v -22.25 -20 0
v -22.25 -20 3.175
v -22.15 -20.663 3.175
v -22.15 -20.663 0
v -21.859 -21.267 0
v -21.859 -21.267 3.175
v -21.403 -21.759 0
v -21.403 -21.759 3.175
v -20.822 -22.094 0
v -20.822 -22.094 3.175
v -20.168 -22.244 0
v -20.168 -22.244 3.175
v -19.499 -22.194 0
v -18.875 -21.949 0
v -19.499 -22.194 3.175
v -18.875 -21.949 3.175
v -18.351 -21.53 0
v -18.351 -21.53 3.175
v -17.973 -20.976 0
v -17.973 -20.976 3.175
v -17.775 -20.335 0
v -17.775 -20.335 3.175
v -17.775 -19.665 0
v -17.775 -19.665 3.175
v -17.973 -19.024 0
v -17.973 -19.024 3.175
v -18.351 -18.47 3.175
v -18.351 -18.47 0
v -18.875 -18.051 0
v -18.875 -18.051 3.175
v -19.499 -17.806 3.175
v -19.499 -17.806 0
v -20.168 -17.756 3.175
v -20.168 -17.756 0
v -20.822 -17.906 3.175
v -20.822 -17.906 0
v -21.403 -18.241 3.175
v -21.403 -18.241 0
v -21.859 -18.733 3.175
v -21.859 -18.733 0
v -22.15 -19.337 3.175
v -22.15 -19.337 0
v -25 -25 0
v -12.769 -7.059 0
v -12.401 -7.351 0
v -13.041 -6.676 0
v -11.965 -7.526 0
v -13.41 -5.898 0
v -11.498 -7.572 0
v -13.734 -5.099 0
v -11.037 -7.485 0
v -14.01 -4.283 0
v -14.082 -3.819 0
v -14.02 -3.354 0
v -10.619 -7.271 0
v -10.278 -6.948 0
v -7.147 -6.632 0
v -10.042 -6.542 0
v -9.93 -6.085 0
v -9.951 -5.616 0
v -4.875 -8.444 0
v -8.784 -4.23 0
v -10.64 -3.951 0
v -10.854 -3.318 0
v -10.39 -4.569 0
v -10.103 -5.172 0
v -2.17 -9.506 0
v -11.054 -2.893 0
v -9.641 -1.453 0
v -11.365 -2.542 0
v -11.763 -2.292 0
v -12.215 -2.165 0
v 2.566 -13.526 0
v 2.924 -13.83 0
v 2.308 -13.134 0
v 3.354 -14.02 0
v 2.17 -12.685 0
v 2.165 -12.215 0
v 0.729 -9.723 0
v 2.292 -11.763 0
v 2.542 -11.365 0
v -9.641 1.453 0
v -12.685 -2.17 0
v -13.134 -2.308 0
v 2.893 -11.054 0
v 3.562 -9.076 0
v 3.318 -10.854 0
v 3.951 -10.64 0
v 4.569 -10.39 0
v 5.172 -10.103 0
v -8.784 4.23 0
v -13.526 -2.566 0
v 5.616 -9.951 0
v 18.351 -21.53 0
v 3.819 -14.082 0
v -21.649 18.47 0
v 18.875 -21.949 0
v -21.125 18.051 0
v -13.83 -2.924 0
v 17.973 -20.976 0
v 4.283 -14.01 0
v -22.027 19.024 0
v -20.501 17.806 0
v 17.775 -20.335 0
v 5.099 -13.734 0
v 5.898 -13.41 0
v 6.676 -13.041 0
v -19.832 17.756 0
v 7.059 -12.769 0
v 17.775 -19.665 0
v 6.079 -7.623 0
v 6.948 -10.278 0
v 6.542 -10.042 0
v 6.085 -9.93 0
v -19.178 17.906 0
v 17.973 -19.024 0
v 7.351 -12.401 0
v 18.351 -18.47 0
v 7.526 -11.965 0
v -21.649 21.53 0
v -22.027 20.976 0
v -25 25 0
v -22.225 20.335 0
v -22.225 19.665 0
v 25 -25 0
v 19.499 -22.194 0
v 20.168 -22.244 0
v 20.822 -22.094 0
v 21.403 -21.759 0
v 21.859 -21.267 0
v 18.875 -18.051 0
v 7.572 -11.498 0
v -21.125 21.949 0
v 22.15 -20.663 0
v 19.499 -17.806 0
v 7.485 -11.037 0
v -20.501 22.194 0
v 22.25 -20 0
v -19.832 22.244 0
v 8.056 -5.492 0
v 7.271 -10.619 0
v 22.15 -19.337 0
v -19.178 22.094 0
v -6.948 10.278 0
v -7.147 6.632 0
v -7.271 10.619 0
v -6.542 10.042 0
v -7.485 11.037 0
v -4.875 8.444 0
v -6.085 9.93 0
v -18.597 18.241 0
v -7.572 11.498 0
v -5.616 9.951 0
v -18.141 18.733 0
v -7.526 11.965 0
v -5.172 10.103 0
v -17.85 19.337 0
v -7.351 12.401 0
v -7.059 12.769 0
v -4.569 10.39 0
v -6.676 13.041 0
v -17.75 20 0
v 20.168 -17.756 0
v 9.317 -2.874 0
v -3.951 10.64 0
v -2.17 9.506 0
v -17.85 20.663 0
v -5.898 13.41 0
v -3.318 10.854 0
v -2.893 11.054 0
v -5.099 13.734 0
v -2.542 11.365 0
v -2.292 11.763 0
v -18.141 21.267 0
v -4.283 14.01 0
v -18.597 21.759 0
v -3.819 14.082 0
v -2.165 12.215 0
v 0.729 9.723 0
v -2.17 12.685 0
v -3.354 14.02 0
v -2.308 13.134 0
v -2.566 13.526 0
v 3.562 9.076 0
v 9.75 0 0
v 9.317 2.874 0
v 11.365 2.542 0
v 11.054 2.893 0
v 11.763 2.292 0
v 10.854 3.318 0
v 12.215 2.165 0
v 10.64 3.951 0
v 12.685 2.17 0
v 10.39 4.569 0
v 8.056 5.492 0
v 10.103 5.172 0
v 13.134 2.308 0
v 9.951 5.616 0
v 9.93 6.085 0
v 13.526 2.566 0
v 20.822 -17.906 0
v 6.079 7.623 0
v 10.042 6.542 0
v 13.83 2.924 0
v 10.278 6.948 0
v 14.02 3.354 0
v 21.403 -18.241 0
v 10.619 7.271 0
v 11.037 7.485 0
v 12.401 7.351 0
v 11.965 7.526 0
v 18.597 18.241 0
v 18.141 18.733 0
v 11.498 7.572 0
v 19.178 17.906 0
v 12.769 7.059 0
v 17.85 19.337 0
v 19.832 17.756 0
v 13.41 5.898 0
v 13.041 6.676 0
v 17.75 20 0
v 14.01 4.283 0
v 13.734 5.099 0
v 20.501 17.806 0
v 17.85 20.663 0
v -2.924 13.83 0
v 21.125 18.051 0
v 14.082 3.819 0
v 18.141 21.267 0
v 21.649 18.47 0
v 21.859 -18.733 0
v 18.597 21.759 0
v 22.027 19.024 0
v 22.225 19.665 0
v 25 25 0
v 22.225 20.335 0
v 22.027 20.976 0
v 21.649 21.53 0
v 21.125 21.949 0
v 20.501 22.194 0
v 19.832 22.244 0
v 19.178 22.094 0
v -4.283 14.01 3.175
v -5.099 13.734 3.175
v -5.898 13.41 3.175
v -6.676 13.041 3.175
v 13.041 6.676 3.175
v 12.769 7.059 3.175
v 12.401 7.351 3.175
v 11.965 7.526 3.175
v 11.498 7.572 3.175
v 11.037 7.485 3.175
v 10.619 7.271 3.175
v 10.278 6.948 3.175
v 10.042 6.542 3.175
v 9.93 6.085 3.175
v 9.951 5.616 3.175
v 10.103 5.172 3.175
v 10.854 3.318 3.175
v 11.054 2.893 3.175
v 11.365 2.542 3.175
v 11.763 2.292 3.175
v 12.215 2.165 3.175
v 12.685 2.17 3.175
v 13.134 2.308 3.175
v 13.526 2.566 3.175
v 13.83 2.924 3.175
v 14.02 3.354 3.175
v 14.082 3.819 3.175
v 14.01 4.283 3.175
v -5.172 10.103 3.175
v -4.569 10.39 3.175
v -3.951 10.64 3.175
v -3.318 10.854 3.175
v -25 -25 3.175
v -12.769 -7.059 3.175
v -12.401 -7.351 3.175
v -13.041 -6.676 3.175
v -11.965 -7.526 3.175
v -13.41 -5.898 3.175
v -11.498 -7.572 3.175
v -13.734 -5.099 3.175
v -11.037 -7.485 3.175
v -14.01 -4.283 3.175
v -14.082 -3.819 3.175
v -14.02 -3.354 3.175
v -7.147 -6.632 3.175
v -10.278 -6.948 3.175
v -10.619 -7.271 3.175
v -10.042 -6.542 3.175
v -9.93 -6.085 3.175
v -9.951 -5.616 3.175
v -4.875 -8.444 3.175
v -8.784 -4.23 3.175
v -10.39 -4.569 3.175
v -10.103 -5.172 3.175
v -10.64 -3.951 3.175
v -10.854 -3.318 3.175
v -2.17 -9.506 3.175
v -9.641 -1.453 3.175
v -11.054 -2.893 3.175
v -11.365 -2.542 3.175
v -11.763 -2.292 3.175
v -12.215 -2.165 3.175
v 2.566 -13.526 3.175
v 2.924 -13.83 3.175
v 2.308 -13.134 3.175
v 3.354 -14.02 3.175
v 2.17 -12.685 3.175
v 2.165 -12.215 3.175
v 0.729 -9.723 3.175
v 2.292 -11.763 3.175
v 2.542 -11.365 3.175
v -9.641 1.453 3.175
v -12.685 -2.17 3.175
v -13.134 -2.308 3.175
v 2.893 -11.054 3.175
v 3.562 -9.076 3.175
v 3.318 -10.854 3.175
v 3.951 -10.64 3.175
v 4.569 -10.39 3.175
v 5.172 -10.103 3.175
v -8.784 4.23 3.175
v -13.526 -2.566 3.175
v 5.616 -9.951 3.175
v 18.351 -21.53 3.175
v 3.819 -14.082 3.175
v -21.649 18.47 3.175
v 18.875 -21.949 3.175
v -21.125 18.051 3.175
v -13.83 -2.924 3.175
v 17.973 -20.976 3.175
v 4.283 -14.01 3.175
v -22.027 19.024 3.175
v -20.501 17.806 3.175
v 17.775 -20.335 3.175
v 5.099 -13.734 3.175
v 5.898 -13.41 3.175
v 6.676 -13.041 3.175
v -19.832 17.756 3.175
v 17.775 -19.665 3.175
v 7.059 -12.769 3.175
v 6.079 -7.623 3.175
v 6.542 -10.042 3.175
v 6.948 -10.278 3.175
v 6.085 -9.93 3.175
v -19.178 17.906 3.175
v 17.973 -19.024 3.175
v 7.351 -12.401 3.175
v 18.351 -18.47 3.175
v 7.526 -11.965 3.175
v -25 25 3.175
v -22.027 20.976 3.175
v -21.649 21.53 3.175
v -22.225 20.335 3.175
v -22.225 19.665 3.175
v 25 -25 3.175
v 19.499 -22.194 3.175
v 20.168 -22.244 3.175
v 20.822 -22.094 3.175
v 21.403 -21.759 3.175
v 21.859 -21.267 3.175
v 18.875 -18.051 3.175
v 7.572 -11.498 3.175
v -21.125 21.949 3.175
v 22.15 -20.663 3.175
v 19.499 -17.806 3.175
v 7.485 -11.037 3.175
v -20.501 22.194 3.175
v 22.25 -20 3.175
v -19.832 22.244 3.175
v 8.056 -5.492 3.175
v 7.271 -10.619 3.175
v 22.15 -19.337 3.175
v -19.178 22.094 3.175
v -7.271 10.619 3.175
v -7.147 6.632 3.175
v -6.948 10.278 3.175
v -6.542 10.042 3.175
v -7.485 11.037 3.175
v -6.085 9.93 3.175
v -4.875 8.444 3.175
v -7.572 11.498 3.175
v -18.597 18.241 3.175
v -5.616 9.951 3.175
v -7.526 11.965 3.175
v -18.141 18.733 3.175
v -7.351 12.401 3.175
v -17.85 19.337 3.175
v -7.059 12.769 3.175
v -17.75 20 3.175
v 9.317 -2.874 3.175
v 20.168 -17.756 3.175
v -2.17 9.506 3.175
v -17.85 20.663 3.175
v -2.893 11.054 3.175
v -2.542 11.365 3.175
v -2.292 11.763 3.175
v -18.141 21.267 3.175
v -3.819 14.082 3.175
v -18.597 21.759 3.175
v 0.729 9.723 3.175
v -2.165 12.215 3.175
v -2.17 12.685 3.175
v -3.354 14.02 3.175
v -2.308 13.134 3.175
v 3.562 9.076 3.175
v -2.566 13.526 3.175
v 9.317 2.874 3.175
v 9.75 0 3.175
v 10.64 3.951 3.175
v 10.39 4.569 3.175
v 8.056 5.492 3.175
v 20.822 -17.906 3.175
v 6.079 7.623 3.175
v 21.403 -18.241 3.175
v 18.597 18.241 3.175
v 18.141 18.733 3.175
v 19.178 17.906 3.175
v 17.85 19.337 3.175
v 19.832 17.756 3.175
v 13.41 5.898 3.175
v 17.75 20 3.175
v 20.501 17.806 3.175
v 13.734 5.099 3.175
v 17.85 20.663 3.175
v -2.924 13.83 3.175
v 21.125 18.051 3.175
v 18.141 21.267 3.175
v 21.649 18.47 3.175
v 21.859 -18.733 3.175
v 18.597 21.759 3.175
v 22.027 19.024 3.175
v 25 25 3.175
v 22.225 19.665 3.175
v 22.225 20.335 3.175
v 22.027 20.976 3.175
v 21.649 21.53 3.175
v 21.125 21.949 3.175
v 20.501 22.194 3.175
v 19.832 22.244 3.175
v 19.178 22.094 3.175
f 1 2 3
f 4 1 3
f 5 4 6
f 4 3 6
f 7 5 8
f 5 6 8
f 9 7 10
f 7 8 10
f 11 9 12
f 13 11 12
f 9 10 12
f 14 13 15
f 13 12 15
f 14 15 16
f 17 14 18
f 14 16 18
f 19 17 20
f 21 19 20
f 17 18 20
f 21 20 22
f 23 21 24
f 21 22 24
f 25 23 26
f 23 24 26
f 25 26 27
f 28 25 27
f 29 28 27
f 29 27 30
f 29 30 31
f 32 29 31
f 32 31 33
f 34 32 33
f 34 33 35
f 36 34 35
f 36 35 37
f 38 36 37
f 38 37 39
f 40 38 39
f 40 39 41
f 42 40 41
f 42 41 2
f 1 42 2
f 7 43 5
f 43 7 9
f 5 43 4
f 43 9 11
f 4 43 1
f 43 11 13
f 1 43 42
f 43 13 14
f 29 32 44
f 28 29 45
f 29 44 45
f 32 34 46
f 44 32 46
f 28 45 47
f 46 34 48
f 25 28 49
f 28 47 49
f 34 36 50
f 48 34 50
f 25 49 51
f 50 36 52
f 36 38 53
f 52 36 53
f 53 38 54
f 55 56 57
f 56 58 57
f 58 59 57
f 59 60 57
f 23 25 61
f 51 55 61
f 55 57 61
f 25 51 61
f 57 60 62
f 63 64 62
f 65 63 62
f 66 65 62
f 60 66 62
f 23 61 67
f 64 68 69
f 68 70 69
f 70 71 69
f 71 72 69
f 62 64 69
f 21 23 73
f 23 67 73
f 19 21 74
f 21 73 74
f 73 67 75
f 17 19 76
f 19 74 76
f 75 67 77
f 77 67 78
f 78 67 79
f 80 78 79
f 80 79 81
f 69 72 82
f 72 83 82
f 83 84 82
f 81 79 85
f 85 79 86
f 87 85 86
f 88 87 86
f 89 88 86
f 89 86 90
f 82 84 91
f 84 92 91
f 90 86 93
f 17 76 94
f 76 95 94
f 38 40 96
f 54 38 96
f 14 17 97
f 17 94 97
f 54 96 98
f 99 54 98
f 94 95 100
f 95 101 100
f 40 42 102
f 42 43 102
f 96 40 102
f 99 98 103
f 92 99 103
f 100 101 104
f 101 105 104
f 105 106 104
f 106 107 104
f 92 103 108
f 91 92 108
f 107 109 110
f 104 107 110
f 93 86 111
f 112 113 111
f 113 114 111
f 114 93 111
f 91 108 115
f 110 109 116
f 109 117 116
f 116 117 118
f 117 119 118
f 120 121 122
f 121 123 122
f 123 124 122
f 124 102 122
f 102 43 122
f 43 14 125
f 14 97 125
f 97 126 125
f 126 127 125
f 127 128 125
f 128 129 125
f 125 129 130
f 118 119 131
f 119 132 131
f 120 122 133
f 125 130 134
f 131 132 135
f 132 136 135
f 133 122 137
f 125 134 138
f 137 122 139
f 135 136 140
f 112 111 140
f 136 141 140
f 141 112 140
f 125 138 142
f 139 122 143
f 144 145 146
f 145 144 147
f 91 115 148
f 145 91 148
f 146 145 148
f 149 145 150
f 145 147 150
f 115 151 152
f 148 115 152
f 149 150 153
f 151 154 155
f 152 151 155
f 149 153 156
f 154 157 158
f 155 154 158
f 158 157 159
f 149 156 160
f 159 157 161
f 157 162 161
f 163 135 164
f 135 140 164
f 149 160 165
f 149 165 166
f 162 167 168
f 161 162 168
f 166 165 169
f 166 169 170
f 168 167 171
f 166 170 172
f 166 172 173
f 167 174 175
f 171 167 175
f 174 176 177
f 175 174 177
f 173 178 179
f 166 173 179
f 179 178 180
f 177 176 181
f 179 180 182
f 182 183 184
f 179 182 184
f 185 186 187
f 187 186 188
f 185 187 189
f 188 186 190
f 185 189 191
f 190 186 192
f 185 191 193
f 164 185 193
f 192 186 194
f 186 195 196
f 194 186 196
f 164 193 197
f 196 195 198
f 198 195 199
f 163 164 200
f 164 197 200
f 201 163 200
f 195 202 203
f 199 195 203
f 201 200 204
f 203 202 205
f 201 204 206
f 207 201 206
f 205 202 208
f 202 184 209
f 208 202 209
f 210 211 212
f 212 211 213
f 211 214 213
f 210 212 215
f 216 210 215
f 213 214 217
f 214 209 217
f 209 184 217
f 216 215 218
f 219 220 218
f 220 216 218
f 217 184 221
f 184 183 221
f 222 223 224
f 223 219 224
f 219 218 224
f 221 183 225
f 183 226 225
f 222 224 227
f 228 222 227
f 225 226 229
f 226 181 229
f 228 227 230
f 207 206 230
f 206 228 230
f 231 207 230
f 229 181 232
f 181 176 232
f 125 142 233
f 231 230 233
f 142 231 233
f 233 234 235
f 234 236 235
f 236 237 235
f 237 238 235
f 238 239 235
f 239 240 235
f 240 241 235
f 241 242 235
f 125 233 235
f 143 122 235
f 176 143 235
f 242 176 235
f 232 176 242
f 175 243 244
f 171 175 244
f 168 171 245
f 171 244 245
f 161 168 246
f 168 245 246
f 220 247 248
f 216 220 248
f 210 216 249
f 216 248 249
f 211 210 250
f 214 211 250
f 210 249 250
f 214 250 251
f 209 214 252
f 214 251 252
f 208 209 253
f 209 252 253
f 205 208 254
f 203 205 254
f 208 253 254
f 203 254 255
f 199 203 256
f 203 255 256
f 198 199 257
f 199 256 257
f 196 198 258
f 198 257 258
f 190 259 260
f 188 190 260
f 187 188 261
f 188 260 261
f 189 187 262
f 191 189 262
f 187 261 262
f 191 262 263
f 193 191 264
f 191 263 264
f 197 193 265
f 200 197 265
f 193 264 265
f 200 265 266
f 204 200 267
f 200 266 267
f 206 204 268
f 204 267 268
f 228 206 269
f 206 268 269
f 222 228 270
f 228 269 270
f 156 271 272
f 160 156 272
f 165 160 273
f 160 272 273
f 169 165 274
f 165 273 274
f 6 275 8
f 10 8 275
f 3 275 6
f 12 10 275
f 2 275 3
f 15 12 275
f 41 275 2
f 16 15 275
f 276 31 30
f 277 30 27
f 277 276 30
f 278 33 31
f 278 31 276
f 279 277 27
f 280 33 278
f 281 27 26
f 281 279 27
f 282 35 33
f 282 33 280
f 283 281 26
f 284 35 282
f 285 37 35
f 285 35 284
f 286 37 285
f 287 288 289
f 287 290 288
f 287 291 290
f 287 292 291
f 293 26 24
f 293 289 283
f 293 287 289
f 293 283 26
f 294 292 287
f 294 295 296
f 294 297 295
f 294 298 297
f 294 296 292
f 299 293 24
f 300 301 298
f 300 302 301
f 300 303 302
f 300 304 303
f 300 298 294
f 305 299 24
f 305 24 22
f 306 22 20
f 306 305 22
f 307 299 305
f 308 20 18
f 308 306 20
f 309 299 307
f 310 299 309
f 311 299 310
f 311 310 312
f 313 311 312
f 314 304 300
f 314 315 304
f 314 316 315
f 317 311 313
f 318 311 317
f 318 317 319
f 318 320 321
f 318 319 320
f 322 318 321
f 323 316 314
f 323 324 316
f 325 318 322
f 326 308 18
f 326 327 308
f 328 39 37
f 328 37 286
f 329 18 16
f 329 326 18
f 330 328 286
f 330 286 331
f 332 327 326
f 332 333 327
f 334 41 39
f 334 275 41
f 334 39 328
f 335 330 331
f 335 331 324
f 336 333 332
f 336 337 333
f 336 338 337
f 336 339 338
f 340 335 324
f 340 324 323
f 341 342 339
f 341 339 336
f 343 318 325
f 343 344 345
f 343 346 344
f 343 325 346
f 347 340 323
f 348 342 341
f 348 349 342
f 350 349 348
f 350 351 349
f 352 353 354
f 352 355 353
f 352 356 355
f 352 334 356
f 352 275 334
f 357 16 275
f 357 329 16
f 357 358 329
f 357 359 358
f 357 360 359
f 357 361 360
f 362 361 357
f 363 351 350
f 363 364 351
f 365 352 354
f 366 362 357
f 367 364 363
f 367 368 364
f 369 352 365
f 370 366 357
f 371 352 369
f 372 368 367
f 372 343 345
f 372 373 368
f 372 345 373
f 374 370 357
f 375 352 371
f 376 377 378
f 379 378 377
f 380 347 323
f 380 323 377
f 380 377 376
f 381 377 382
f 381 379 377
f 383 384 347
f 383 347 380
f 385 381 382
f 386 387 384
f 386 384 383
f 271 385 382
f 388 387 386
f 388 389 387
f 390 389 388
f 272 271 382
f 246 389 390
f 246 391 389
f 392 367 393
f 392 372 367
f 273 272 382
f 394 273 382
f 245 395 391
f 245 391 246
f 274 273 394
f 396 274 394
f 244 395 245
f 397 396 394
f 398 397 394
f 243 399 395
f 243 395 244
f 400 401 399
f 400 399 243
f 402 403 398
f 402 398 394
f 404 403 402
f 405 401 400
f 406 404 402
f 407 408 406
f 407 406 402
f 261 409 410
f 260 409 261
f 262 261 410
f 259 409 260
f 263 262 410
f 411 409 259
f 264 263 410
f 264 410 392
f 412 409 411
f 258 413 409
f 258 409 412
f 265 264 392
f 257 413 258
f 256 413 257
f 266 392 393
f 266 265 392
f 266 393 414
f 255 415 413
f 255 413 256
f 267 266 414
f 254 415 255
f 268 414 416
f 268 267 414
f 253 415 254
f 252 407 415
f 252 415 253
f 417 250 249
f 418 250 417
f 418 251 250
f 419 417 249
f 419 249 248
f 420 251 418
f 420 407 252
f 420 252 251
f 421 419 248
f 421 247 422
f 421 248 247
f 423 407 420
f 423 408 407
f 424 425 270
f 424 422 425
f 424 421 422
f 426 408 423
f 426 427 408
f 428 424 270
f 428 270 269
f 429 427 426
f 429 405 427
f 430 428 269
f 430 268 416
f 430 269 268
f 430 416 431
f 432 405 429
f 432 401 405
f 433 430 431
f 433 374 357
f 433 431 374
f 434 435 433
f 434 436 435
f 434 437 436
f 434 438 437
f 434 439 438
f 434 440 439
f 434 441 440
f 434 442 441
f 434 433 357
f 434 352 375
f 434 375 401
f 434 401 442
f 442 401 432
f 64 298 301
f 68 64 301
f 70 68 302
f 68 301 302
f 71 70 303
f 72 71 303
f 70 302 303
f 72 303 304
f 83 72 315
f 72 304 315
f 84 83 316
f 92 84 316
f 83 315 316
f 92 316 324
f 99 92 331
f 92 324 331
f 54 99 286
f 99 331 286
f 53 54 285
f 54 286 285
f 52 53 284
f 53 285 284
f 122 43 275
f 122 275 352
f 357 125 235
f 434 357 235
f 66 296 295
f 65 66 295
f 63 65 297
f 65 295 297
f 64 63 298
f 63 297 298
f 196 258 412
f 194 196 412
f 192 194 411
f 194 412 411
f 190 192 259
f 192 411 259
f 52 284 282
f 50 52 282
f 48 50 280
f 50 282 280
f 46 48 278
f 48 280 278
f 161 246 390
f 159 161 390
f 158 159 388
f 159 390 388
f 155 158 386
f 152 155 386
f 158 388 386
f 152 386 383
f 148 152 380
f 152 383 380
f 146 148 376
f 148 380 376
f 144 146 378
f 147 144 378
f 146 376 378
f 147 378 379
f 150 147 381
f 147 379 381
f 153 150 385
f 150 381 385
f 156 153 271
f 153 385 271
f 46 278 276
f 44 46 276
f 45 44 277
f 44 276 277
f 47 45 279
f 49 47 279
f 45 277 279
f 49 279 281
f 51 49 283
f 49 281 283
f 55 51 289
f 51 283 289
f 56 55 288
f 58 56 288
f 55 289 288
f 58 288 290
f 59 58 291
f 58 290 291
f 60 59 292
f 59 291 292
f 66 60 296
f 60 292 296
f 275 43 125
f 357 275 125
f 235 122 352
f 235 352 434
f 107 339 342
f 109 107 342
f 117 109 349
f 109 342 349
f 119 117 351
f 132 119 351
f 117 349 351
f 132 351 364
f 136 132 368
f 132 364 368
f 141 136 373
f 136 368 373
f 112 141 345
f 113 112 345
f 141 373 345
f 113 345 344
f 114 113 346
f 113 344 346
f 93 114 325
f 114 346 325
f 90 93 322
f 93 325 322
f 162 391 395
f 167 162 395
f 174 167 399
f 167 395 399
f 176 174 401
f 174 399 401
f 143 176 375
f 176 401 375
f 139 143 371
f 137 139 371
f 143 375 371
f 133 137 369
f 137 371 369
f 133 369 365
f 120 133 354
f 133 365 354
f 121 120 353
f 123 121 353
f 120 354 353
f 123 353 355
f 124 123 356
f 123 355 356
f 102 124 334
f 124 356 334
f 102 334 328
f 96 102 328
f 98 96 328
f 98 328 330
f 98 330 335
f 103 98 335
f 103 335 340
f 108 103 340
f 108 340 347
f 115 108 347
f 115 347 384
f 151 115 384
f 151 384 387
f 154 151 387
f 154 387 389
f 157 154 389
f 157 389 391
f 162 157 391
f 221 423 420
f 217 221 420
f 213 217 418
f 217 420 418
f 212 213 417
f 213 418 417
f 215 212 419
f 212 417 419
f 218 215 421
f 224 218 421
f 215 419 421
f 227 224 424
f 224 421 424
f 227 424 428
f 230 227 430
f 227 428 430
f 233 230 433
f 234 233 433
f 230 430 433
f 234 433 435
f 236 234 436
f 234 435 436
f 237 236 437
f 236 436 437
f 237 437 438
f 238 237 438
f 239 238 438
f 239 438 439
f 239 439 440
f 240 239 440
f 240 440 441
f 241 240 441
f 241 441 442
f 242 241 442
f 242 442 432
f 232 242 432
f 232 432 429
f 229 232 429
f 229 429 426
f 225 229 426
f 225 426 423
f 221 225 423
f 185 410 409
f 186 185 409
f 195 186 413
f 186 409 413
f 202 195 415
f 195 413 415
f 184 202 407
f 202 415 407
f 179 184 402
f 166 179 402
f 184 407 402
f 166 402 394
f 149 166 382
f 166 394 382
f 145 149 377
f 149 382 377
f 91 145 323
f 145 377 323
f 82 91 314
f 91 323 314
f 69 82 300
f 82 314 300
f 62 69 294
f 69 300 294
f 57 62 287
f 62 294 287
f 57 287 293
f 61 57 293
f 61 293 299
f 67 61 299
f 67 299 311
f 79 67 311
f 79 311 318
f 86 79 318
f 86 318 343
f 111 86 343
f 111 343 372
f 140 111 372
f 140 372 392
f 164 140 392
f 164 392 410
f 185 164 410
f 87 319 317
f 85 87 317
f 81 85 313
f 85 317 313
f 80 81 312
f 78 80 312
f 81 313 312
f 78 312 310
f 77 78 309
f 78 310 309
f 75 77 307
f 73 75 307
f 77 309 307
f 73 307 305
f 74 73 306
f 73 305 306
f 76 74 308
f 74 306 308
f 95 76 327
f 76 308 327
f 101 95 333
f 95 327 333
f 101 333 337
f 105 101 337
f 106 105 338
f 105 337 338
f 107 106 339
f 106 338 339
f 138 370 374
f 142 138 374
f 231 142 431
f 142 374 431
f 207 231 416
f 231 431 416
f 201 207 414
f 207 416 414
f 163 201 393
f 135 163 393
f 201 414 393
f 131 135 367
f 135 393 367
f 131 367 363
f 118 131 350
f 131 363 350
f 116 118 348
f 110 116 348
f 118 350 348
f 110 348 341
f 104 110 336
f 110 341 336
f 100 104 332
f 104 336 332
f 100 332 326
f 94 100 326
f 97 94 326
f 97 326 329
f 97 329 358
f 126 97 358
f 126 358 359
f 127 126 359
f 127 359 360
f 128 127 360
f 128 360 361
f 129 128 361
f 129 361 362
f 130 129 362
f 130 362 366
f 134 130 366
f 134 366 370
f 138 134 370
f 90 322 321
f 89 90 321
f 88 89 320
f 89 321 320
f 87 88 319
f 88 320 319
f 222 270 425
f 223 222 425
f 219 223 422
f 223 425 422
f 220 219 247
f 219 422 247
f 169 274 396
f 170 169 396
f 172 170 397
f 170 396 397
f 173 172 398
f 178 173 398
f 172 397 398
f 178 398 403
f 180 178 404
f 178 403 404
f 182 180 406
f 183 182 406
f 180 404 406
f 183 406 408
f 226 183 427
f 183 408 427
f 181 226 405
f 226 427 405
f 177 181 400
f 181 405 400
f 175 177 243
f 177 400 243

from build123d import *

# Parameters (mm, degrees)
SKETCH1_W           = 50
SKETCH1_H           = 50
BOSS_EXTRUDE1_DEPTH = 3.175
SKETCH2_R           = 9.75
CUT_EXTRUDE1_DEPTH  = 36.497614356
CUT_EXTRUDE2_DEPTH  = 36.497614356
SKETCH4_R           = 2.25
CUT_EXTRUDE3_DEPTH  = 36.497614356


with BuildPart() as part:
    # Sketch1 → Boss-Extrude1 (new body)
    with BuildSketch(Plane.XY):
        Rectangle(SKETCH1_W, SKETCH1_H)
    extrude(amount=BOSS_EXTRUDE1_DEPTH)

    # Sketch2 → Cut-Extrude1 (cut, through all)
    with BuildSketch(Plane.XY.offset(3.175)):
        Circle(SKETCH2_R)
    extrude(amount=-CUT_EXTRUDE1_DEPTH, mode=Mode.SUBTRACT)

    # Sketch3 → Cut-Extrude2 (cut, through all)
    with BuildSketch(Plane.XY.offset(3.175)):
        with BuildLine():
            ThreePointArc((-4.283245474, 14.009864675), (-5.500937795, 13.57800366), (-6.675845238, 13.040536429))
            ThreePointArc((-6.675845238, 13.040536429), (-7.392687591, 10.819920064), (-5.172071225, 10.103077711))
            ThreePointArc((-5.172071225, 10.103077711), (-4.261818701, 10.519477238), (-3.318418849, 10.85405898))
            ThreePointArc((-3.318418849, 10.85405898), (-2.222929314, 12.91437514), (-4.283245474, 14.009864675))
        make_face()
        with BuildLine():
            ThreePointArc((14.009864675, 4.283245474), (13.57800366, 5.500937795), (13.040536429, 6.675845238))
            ThreePointArc((13.040536429, 6.675845238), (10.819920064, 7.392687591), (10.103077711, 5.172071225))
            ThreePointArc((10.103077711, 5.172071225), (10.519477238, 4.261818701), (10.85405898, 3.318418849))
            ThreePointArc((10.85405898, 3.318418849), (12.91437514, 2.222929314), (14.009864675, 4.283245474))
        make_face()
        with BuildLine():
            ThreePointArc((4.283245474, -14.009864675), (5.500937795, -13.57800366), (6.675845238, -13.040536429))
            ThreePointArc((6.675845238, -13.040536429), (7.392687591, -10.819920064), (5.172071225, -10.103077711))
            ThreePointArc((5.172071225, -10.103077711), (4.261818701, -10.519477238), (3.318418849, -10.85405898))
            ThreePointArc((3.318418849, -10.85405898), (2.222929314, -12.91437514), (4.283245474, -14.009864675))
        make_face()
        with BuildLine():
            ThreePointArc((-14.009864675, -4.283245474), (-13.57800366, -5.500937795), (-13.040536429, -6.675845238))
            ThreePointArc((-13.040536429, -6.675845238), (-10.819920064, -7.392687591), (-10.103077711, -5.172071225))
            ThreePointArc((-10.103077711, -5.172071225), (-10.519477238, -4.261818701), (-10.85405898, -3.318418849))
            ThreePointArc((-10.85405898, -3.318418849), (-12.91437514, -2.222929314), (-14.009864675, -4.283245474))
        make_face()
    extrude(amount=-CUT_EXTRUDE2_DEPTH, mode=Mode.SUBTRACT)

    # Sketch4 → Cut-Extrude3 (cut, through all)
    with BuildSketch(Plane.XY.offset(3.175)):
        with Locations((-20, 20)):
            Circle(SKETCH4_R)
        with Locations(Location((-20, -20, 0), (0, 0, 180))):
            Circle(SKETCH4_R)
        with Locations(Location((20, 20, 0), (0, 0, 180))):
            Circle(SKETCH4_R)
        with Locations((20, -20)):
            Circle(SKETCH4_R)
    extrude(amount=-CUT_EXTRUDE3_DEPTH, mode=Mode.SUBTRACT)


solid = part.part
